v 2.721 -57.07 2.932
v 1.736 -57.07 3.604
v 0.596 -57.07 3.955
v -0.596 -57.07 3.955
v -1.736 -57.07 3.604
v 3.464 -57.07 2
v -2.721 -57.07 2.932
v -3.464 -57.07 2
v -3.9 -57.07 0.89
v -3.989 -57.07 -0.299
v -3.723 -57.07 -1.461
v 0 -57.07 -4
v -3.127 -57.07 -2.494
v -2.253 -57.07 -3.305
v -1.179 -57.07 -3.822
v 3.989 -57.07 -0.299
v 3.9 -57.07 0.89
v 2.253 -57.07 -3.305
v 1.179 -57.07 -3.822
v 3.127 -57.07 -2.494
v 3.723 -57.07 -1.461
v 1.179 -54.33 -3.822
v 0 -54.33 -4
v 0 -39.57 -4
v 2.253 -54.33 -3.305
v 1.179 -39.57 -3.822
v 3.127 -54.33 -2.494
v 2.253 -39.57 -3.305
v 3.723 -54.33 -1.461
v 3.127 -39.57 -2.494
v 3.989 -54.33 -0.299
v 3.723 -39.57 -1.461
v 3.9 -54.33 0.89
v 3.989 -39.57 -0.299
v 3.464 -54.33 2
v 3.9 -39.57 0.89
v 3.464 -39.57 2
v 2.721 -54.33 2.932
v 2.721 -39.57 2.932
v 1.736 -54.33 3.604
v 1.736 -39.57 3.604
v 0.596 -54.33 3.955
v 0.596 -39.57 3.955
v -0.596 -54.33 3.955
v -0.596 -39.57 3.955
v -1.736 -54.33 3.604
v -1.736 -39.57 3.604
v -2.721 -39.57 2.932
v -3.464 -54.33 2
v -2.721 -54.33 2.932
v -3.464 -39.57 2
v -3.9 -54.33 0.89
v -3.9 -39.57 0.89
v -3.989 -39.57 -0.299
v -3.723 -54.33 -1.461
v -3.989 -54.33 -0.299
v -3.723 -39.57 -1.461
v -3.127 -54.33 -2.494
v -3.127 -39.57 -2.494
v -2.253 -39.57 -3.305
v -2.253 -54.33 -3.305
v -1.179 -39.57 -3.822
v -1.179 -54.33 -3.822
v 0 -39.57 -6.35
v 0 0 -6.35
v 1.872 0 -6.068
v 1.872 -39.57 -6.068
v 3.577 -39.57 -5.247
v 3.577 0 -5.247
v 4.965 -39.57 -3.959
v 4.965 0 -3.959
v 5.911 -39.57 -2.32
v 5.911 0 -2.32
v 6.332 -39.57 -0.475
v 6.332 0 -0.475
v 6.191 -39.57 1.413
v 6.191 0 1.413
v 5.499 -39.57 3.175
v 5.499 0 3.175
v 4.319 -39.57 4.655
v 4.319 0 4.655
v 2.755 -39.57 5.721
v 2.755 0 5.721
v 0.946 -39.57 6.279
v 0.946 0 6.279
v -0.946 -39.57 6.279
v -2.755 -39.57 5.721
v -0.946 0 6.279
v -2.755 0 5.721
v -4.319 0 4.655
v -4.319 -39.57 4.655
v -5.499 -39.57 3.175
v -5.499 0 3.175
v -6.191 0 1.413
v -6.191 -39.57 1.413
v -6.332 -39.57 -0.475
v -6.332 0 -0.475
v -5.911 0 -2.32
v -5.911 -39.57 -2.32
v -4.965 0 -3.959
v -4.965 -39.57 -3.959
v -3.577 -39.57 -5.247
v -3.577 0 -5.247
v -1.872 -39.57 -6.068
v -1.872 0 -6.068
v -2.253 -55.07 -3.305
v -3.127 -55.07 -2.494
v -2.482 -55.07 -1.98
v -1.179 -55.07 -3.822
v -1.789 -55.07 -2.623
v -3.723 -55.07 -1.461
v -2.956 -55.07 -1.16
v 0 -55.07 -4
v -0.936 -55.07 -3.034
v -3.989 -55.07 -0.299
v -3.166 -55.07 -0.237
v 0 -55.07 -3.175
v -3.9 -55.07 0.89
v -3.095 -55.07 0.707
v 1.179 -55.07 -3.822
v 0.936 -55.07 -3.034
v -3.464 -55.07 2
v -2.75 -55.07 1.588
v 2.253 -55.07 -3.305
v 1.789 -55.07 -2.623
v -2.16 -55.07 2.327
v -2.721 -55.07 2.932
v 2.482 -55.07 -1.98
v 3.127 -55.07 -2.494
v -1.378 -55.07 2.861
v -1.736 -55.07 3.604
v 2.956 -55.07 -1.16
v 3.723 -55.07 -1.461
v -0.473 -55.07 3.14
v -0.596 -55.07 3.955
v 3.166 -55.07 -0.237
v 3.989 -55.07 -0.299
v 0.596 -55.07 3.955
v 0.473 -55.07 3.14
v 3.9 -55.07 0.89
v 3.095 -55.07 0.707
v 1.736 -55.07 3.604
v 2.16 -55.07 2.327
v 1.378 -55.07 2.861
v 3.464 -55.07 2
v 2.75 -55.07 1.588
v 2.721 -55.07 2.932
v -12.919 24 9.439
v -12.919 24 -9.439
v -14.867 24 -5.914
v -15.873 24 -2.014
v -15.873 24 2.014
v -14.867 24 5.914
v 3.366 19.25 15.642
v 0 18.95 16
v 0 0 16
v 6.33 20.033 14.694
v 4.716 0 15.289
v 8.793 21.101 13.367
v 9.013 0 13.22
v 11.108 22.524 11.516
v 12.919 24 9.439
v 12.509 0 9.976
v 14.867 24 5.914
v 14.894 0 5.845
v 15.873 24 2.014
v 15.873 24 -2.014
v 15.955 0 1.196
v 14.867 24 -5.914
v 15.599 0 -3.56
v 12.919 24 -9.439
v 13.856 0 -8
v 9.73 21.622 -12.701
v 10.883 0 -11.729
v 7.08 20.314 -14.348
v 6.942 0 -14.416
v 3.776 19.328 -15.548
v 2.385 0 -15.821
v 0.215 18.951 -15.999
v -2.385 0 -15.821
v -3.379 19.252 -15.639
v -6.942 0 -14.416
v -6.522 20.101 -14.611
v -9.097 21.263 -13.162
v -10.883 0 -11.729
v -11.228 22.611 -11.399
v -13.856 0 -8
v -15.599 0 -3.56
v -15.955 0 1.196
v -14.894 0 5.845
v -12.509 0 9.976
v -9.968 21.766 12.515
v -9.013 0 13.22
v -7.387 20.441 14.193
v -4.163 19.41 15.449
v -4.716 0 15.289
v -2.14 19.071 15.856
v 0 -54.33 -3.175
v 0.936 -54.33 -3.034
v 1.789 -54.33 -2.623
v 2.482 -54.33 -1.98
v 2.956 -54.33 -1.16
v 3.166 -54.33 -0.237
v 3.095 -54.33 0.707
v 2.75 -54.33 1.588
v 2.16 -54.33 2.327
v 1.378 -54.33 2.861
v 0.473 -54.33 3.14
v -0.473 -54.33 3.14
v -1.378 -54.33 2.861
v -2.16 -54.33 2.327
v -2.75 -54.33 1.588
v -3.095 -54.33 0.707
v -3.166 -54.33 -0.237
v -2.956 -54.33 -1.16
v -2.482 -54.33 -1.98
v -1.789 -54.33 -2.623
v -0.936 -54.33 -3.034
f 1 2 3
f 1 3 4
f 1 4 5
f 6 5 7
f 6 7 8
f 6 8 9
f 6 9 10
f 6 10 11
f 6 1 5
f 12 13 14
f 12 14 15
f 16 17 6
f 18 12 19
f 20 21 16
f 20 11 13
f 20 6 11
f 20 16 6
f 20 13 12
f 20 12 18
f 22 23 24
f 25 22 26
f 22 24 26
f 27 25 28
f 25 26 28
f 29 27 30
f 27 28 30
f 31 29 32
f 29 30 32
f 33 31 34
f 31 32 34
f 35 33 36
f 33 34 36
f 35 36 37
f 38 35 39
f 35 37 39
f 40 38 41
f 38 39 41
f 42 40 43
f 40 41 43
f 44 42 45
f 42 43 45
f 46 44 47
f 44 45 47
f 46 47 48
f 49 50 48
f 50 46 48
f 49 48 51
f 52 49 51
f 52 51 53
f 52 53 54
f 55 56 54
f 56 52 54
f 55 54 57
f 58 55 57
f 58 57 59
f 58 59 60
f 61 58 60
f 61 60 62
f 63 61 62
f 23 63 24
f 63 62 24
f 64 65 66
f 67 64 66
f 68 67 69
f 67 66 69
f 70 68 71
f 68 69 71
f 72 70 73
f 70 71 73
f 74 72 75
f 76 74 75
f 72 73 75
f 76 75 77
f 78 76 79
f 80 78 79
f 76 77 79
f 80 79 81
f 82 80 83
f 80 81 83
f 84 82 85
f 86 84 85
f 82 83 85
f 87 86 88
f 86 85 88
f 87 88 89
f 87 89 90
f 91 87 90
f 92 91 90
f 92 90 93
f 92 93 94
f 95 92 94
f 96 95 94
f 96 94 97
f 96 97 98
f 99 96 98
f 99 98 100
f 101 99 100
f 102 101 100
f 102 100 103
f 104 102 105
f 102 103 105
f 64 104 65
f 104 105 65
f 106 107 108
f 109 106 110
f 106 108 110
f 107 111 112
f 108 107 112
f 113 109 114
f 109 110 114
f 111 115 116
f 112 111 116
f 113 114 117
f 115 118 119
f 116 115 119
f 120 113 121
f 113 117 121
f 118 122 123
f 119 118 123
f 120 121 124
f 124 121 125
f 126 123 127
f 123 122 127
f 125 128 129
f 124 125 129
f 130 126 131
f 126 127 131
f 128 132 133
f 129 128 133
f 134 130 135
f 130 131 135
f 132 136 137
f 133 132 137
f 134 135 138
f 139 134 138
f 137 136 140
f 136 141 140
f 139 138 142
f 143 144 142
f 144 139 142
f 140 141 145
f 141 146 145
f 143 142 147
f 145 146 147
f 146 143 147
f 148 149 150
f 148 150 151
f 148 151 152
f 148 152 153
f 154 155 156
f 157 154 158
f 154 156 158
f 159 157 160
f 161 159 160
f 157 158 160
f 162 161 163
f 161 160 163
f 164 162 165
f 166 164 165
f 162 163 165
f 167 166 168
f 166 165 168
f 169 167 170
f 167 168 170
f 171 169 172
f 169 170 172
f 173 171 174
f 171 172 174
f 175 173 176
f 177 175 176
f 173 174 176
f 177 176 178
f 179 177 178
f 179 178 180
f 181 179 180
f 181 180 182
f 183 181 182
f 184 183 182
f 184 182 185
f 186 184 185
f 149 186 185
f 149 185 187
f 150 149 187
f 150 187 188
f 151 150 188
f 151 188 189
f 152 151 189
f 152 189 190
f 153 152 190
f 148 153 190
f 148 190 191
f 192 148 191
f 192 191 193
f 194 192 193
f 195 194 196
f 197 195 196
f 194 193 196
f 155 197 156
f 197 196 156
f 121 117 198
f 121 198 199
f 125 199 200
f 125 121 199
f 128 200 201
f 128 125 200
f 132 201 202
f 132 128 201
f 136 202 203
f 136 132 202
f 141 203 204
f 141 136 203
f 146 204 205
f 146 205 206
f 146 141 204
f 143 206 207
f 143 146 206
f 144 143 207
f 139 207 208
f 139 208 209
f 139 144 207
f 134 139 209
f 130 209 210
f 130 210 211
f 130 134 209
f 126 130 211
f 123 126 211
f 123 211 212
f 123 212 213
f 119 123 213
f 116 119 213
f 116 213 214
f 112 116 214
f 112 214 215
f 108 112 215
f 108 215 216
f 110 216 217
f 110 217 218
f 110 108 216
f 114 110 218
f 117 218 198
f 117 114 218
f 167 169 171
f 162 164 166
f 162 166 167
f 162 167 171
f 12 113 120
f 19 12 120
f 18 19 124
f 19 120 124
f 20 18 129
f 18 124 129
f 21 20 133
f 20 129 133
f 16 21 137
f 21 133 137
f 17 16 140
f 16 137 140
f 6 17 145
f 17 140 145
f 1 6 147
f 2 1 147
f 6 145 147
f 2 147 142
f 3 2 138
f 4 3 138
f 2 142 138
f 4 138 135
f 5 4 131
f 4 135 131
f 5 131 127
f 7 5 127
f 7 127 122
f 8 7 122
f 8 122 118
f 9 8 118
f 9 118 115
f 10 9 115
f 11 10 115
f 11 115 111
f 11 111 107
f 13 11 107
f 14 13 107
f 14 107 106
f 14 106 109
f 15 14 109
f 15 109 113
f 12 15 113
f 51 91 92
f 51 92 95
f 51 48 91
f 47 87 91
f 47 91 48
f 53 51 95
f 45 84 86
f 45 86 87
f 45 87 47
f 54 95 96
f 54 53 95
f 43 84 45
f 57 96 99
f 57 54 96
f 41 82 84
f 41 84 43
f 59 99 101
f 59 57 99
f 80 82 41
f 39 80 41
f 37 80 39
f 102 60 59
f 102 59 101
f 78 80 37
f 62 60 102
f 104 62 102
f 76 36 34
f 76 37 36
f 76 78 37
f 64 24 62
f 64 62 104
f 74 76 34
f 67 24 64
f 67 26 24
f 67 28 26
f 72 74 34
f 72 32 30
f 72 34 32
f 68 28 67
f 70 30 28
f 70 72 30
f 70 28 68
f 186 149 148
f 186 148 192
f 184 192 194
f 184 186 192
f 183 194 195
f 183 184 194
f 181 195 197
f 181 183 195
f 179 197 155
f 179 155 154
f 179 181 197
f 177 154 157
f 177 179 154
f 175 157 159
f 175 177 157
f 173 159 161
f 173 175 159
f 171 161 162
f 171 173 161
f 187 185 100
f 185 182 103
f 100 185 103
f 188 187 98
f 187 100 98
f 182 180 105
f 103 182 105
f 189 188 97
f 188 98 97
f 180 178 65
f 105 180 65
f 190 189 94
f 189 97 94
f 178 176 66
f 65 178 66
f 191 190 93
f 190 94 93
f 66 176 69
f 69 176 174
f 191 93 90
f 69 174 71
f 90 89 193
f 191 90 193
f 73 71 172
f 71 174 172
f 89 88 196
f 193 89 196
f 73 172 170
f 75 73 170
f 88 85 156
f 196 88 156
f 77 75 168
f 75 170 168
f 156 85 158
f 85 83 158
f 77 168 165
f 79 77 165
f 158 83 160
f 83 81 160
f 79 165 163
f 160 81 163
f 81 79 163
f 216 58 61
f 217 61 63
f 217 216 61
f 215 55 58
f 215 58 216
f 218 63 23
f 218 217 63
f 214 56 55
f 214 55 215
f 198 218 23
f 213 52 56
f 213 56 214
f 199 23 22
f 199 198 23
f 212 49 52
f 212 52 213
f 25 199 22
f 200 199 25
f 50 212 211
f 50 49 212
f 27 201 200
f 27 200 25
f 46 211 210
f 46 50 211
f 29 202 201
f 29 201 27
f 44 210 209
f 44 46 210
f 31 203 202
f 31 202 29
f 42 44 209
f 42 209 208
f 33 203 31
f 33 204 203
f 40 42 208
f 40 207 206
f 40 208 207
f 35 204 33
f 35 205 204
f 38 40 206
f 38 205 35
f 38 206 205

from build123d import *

# Parameters (mm, degrees)
SKETCH1_R               = 16
BOSS_EXTRUDE1_DEPTH     = 24
SKETCH2_R               = 6.35
BOSS_EXTRUDE2_DEPTH     = 39.57
SKETCH3_R               = 4
BOSS_EXTRUDE3_DEPTH     = 17.5
CUT_EXTRUDE1_DEPTH      = 62.392058933
CUT_EXTRUDE1_DEPTH_BACK = 62.392058933
SKETCH4_R               = 19.05
CUT_EXTRUDE2_START      = -2
SKETCH5_R               = 4.571040919
SKETCH5_R_2             = 3.175
CUT_EXTRUDE2_DEPTH      = 0.74


with BuildPart() as part:
    # Sketch1 → Boss-Extrude1 (new body)
    with BuildSketch(Plane(origin=(0, 0, 0), x_dir=(1, 0, 0), z_dir=(0, 1, 0))):
        with Locations(Location((0, 0, 0), (0, 0, 270))):
            Circle(SKETCH1_R)
    extrude(amount=BOSS_EXTRUDE1_DEPTH)

    # Sketch2 → Boss-Extrude2 (add)
    with BuildSketch(Plane.XZ):
        with Locations(Location((0, 0, 0), (0, 0, 270))):
            Circle(SKETCH2_R)
    extrude(amount=BOSS_EXTRUDE2_DEPTH)

    # Sketch3 → Boss-Extrude3 (add)
    with BuildSketch(Plane.XZ.offset(39.57)):
        with Locations(Location((0, 0, 0), (0, 0, 270))):
            Circle(SKETCH3_R)
    extrude(amount=BOSS_EXTRUDE3_DEPTH)

    # Sketch4 → Cut-Extrude1 (cut, two sides: drawn at the far end of the back side and taken through both)
    with BuildSketch(Plane.XY.offset(-CUT_EXTRUDE1_DEPTH_BACK)):
        with Locations((0, 38)):
            Circle(SKETCH4_R)
    extrude(amount=CUT_EXTRUDE1_DEPTH + CUT_EXTRUDE1_DEPTH_BACK, mode=Mode.SUBTRACT)

    # Sketch5 → Cut-Extrude2 (cut)
    with BuildSketch(Plane.XZ.offset(57.07).offset(CUT_EXTRUDE2_START)):
        Circle(SKETCH5_R)
        with Locations(Location((0, 0, 0), (0, 0, 270))):
            Circle(SKETCH5_R_2, mode=Mode.SUBTRACT)
    extrude(amount=-CUT_EXTRUDE2_DEPTH, mode=Mode.SUBTRACT)


solid = part.part
